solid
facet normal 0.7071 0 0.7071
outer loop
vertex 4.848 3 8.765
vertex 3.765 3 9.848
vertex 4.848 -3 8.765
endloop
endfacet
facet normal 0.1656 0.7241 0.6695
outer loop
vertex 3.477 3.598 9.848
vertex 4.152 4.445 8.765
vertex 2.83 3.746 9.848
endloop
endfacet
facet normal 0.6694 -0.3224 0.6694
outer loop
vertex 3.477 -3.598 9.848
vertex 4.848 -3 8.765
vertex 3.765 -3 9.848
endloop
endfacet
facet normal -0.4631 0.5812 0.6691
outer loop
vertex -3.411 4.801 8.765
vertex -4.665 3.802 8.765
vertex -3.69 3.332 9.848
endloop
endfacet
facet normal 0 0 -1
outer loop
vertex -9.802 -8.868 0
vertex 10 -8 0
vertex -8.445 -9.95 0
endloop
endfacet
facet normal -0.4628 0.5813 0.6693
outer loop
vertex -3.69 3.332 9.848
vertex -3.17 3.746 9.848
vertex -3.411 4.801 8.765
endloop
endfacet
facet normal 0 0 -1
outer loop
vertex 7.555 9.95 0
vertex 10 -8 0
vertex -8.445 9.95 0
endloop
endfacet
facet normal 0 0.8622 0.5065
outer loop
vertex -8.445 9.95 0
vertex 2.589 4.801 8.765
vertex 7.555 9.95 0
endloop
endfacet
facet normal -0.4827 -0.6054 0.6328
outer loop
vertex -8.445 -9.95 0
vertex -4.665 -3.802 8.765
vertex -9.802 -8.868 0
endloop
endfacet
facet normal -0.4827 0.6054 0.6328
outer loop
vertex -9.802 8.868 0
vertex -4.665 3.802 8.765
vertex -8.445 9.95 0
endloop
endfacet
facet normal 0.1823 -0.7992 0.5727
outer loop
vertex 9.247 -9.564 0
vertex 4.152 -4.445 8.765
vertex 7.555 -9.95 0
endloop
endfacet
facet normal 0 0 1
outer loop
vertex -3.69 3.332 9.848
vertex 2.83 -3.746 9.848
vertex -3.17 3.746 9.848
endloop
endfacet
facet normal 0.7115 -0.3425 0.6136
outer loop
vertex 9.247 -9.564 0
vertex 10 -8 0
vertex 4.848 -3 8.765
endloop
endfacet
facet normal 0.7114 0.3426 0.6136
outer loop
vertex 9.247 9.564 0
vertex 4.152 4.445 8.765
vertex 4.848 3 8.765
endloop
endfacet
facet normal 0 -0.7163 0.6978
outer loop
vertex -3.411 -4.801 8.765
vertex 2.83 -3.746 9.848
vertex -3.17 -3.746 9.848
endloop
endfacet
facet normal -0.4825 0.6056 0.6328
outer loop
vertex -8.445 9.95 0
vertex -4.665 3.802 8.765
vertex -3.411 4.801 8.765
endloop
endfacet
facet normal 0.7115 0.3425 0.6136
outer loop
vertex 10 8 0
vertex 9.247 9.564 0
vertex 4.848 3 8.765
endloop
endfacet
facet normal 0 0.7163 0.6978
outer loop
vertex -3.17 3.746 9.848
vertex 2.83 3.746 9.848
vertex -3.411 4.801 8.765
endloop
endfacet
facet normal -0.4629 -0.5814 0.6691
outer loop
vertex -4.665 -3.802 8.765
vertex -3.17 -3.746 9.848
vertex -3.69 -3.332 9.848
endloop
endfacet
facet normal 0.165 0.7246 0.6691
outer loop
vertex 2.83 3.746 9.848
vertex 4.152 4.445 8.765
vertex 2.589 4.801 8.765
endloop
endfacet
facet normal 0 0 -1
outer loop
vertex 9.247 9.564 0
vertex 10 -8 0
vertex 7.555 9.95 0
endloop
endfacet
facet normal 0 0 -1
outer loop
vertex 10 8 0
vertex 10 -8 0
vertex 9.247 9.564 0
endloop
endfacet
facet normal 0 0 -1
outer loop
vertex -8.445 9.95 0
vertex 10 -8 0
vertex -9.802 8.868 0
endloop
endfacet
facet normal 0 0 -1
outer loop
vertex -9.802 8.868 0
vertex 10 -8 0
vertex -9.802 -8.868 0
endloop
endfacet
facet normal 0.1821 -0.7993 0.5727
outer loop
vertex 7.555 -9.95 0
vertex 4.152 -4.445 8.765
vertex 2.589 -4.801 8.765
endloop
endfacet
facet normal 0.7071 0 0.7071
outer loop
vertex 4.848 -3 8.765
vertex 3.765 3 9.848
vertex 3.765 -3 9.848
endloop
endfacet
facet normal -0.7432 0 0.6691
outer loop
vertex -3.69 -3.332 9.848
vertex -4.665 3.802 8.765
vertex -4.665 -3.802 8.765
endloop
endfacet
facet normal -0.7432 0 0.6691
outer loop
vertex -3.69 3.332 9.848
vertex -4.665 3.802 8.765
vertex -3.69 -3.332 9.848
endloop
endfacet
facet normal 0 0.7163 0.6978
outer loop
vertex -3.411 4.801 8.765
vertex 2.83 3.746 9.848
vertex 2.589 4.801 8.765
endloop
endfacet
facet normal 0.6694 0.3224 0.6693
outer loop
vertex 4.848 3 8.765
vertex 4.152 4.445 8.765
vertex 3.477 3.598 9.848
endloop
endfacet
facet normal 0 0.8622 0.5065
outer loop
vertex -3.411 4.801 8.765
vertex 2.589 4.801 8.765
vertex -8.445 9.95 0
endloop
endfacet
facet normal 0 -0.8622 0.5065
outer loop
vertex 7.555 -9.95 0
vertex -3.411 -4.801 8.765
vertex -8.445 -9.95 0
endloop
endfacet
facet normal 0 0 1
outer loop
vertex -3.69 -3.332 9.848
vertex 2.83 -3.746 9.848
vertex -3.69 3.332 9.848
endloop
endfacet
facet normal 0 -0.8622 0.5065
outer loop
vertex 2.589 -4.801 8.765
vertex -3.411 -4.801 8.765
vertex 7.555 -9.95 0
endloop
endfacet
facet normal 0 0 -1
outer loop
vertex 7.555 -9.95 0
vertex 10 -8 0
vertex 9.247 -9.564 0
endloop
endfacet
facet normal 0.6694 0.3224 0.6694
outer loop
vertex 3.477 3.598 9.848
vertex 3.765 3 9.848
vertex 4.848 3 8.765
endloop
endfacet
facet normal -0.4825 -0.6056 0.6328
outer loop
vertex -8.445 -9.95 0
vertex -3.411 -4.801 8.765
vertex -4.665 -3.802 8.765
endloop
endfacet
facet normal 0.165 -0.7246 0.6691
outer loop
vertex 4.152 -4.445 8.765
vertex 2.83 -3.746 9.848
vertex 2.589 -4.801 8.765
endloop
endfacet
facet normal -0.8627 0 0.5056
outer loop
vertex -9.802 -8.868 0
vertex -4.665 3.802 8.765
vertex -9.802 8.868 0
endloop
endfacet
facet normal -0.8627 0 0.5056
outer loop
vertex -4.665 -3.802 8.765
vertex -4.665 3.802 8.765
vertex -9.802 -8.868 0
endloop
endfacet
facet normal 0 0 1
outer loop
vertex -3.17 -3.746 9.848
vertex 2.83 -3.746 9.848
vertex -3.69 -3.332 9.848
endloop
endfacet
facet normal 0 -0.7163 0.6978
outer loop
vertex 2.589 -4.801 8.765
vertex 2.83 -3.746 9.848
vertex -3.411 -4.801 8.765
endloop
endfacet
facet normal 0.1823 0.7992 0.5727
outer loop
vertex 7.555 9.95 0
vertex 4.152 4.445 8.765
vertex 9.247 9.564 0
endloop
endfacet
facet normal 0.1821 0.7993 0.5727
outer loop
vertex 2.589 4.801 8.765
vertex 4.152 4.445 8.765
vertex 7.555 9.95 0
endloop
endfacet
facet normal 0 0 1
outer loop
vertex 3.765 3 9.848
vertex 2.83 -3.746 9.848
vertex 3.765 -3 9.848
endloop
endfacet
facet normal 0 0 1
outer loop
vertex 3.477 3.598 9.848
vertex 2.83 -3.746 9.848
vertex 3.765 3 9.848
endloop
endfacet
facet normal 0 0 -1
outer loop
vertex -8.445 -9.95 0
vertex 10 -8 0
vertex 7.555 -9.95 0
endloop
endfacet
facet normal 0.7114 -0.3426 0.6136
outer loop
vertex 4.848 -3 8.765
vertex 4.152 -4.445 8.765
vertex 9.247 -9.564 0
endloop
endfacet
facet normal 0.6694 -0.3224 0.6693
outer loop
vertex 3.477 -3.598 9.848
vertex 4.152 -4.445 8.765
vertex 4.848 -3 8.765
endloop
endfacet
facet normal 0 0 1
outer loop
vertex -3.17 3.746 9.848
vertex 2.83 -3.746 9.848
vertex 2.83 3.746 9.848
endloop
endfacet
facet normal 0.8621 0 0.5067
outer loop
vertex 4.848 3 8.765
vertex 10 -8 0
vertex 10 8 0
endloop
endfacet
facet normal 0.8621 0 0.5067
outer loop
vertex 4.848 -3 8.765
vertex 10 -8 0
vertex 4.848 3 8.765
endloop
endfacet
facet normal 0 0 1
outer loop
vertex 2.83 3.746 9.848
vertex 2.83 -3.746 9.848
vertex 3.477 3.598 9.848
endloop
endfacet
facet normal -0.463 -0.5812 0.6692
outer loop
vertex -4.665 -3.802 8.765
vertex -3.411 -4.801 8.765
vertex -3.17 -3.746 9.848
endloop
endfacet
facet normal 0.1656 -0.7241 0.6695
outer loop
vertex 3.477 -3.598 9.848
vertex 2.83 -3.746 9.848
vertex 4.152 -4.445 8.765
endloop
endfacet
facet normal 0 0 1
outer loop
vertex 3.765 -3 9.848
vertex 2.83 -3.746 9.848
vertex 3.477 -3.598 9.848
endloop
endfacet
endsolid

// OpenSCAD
x1y1z = [20, 20, 10];
x2y2  = [10, 10];
r = 2;

top_rounded_block(x1y1z, x2y2, r);


module top_rounded_block(x1y1z,x2y2,r) {
	translate([-x1y1z[0]/2,-x1y1z[1]/2,0]) {
		hull() {
			translate([r,r,0]) cylinder(0.001,r,0);
			translate([x1y1z[0]-r,r,0]) cylinder(0.001,r,0);
			translate([r,x1y1z[1]-r,0]) cylinder(0.001,r,0);
			translate([x1y1z[0]-r,x1y1z[1]-r,0]) cylinder(0.001,r,0);
			
			translate([
				r+((x1y1z[0]-x2y2[0])/2),
				r+((x1y1z[1]-x2y2[1])/2),
				x1y1z[2]-r
			]) sphere(r);
			
			translate([
				x1y1z[0]-r-((x1y1z[0]-x2y2[0])/2),
				r+((x1y1z[1]-x2y2[1])/2),
				x1y1z[2]-r
			]) sphere(r);
			
			translate([
				r+((x1y1z[0]-x2y2[0])/2),
				x1y1z[1]-r-((x1y1z[1]-x2y2[1])/2),
				x1y1z[2]-r
			]) sphere(r);
			
			translate([
				x1y1z[0]-r-((x1y1z[0]-x2y2[0])/2),
				x1y1z[1]-r-((x1y1z[1]-x2y2[1])/2),
				x1y1z[2]-r
			]) sphere(r);
		}
	}
}
